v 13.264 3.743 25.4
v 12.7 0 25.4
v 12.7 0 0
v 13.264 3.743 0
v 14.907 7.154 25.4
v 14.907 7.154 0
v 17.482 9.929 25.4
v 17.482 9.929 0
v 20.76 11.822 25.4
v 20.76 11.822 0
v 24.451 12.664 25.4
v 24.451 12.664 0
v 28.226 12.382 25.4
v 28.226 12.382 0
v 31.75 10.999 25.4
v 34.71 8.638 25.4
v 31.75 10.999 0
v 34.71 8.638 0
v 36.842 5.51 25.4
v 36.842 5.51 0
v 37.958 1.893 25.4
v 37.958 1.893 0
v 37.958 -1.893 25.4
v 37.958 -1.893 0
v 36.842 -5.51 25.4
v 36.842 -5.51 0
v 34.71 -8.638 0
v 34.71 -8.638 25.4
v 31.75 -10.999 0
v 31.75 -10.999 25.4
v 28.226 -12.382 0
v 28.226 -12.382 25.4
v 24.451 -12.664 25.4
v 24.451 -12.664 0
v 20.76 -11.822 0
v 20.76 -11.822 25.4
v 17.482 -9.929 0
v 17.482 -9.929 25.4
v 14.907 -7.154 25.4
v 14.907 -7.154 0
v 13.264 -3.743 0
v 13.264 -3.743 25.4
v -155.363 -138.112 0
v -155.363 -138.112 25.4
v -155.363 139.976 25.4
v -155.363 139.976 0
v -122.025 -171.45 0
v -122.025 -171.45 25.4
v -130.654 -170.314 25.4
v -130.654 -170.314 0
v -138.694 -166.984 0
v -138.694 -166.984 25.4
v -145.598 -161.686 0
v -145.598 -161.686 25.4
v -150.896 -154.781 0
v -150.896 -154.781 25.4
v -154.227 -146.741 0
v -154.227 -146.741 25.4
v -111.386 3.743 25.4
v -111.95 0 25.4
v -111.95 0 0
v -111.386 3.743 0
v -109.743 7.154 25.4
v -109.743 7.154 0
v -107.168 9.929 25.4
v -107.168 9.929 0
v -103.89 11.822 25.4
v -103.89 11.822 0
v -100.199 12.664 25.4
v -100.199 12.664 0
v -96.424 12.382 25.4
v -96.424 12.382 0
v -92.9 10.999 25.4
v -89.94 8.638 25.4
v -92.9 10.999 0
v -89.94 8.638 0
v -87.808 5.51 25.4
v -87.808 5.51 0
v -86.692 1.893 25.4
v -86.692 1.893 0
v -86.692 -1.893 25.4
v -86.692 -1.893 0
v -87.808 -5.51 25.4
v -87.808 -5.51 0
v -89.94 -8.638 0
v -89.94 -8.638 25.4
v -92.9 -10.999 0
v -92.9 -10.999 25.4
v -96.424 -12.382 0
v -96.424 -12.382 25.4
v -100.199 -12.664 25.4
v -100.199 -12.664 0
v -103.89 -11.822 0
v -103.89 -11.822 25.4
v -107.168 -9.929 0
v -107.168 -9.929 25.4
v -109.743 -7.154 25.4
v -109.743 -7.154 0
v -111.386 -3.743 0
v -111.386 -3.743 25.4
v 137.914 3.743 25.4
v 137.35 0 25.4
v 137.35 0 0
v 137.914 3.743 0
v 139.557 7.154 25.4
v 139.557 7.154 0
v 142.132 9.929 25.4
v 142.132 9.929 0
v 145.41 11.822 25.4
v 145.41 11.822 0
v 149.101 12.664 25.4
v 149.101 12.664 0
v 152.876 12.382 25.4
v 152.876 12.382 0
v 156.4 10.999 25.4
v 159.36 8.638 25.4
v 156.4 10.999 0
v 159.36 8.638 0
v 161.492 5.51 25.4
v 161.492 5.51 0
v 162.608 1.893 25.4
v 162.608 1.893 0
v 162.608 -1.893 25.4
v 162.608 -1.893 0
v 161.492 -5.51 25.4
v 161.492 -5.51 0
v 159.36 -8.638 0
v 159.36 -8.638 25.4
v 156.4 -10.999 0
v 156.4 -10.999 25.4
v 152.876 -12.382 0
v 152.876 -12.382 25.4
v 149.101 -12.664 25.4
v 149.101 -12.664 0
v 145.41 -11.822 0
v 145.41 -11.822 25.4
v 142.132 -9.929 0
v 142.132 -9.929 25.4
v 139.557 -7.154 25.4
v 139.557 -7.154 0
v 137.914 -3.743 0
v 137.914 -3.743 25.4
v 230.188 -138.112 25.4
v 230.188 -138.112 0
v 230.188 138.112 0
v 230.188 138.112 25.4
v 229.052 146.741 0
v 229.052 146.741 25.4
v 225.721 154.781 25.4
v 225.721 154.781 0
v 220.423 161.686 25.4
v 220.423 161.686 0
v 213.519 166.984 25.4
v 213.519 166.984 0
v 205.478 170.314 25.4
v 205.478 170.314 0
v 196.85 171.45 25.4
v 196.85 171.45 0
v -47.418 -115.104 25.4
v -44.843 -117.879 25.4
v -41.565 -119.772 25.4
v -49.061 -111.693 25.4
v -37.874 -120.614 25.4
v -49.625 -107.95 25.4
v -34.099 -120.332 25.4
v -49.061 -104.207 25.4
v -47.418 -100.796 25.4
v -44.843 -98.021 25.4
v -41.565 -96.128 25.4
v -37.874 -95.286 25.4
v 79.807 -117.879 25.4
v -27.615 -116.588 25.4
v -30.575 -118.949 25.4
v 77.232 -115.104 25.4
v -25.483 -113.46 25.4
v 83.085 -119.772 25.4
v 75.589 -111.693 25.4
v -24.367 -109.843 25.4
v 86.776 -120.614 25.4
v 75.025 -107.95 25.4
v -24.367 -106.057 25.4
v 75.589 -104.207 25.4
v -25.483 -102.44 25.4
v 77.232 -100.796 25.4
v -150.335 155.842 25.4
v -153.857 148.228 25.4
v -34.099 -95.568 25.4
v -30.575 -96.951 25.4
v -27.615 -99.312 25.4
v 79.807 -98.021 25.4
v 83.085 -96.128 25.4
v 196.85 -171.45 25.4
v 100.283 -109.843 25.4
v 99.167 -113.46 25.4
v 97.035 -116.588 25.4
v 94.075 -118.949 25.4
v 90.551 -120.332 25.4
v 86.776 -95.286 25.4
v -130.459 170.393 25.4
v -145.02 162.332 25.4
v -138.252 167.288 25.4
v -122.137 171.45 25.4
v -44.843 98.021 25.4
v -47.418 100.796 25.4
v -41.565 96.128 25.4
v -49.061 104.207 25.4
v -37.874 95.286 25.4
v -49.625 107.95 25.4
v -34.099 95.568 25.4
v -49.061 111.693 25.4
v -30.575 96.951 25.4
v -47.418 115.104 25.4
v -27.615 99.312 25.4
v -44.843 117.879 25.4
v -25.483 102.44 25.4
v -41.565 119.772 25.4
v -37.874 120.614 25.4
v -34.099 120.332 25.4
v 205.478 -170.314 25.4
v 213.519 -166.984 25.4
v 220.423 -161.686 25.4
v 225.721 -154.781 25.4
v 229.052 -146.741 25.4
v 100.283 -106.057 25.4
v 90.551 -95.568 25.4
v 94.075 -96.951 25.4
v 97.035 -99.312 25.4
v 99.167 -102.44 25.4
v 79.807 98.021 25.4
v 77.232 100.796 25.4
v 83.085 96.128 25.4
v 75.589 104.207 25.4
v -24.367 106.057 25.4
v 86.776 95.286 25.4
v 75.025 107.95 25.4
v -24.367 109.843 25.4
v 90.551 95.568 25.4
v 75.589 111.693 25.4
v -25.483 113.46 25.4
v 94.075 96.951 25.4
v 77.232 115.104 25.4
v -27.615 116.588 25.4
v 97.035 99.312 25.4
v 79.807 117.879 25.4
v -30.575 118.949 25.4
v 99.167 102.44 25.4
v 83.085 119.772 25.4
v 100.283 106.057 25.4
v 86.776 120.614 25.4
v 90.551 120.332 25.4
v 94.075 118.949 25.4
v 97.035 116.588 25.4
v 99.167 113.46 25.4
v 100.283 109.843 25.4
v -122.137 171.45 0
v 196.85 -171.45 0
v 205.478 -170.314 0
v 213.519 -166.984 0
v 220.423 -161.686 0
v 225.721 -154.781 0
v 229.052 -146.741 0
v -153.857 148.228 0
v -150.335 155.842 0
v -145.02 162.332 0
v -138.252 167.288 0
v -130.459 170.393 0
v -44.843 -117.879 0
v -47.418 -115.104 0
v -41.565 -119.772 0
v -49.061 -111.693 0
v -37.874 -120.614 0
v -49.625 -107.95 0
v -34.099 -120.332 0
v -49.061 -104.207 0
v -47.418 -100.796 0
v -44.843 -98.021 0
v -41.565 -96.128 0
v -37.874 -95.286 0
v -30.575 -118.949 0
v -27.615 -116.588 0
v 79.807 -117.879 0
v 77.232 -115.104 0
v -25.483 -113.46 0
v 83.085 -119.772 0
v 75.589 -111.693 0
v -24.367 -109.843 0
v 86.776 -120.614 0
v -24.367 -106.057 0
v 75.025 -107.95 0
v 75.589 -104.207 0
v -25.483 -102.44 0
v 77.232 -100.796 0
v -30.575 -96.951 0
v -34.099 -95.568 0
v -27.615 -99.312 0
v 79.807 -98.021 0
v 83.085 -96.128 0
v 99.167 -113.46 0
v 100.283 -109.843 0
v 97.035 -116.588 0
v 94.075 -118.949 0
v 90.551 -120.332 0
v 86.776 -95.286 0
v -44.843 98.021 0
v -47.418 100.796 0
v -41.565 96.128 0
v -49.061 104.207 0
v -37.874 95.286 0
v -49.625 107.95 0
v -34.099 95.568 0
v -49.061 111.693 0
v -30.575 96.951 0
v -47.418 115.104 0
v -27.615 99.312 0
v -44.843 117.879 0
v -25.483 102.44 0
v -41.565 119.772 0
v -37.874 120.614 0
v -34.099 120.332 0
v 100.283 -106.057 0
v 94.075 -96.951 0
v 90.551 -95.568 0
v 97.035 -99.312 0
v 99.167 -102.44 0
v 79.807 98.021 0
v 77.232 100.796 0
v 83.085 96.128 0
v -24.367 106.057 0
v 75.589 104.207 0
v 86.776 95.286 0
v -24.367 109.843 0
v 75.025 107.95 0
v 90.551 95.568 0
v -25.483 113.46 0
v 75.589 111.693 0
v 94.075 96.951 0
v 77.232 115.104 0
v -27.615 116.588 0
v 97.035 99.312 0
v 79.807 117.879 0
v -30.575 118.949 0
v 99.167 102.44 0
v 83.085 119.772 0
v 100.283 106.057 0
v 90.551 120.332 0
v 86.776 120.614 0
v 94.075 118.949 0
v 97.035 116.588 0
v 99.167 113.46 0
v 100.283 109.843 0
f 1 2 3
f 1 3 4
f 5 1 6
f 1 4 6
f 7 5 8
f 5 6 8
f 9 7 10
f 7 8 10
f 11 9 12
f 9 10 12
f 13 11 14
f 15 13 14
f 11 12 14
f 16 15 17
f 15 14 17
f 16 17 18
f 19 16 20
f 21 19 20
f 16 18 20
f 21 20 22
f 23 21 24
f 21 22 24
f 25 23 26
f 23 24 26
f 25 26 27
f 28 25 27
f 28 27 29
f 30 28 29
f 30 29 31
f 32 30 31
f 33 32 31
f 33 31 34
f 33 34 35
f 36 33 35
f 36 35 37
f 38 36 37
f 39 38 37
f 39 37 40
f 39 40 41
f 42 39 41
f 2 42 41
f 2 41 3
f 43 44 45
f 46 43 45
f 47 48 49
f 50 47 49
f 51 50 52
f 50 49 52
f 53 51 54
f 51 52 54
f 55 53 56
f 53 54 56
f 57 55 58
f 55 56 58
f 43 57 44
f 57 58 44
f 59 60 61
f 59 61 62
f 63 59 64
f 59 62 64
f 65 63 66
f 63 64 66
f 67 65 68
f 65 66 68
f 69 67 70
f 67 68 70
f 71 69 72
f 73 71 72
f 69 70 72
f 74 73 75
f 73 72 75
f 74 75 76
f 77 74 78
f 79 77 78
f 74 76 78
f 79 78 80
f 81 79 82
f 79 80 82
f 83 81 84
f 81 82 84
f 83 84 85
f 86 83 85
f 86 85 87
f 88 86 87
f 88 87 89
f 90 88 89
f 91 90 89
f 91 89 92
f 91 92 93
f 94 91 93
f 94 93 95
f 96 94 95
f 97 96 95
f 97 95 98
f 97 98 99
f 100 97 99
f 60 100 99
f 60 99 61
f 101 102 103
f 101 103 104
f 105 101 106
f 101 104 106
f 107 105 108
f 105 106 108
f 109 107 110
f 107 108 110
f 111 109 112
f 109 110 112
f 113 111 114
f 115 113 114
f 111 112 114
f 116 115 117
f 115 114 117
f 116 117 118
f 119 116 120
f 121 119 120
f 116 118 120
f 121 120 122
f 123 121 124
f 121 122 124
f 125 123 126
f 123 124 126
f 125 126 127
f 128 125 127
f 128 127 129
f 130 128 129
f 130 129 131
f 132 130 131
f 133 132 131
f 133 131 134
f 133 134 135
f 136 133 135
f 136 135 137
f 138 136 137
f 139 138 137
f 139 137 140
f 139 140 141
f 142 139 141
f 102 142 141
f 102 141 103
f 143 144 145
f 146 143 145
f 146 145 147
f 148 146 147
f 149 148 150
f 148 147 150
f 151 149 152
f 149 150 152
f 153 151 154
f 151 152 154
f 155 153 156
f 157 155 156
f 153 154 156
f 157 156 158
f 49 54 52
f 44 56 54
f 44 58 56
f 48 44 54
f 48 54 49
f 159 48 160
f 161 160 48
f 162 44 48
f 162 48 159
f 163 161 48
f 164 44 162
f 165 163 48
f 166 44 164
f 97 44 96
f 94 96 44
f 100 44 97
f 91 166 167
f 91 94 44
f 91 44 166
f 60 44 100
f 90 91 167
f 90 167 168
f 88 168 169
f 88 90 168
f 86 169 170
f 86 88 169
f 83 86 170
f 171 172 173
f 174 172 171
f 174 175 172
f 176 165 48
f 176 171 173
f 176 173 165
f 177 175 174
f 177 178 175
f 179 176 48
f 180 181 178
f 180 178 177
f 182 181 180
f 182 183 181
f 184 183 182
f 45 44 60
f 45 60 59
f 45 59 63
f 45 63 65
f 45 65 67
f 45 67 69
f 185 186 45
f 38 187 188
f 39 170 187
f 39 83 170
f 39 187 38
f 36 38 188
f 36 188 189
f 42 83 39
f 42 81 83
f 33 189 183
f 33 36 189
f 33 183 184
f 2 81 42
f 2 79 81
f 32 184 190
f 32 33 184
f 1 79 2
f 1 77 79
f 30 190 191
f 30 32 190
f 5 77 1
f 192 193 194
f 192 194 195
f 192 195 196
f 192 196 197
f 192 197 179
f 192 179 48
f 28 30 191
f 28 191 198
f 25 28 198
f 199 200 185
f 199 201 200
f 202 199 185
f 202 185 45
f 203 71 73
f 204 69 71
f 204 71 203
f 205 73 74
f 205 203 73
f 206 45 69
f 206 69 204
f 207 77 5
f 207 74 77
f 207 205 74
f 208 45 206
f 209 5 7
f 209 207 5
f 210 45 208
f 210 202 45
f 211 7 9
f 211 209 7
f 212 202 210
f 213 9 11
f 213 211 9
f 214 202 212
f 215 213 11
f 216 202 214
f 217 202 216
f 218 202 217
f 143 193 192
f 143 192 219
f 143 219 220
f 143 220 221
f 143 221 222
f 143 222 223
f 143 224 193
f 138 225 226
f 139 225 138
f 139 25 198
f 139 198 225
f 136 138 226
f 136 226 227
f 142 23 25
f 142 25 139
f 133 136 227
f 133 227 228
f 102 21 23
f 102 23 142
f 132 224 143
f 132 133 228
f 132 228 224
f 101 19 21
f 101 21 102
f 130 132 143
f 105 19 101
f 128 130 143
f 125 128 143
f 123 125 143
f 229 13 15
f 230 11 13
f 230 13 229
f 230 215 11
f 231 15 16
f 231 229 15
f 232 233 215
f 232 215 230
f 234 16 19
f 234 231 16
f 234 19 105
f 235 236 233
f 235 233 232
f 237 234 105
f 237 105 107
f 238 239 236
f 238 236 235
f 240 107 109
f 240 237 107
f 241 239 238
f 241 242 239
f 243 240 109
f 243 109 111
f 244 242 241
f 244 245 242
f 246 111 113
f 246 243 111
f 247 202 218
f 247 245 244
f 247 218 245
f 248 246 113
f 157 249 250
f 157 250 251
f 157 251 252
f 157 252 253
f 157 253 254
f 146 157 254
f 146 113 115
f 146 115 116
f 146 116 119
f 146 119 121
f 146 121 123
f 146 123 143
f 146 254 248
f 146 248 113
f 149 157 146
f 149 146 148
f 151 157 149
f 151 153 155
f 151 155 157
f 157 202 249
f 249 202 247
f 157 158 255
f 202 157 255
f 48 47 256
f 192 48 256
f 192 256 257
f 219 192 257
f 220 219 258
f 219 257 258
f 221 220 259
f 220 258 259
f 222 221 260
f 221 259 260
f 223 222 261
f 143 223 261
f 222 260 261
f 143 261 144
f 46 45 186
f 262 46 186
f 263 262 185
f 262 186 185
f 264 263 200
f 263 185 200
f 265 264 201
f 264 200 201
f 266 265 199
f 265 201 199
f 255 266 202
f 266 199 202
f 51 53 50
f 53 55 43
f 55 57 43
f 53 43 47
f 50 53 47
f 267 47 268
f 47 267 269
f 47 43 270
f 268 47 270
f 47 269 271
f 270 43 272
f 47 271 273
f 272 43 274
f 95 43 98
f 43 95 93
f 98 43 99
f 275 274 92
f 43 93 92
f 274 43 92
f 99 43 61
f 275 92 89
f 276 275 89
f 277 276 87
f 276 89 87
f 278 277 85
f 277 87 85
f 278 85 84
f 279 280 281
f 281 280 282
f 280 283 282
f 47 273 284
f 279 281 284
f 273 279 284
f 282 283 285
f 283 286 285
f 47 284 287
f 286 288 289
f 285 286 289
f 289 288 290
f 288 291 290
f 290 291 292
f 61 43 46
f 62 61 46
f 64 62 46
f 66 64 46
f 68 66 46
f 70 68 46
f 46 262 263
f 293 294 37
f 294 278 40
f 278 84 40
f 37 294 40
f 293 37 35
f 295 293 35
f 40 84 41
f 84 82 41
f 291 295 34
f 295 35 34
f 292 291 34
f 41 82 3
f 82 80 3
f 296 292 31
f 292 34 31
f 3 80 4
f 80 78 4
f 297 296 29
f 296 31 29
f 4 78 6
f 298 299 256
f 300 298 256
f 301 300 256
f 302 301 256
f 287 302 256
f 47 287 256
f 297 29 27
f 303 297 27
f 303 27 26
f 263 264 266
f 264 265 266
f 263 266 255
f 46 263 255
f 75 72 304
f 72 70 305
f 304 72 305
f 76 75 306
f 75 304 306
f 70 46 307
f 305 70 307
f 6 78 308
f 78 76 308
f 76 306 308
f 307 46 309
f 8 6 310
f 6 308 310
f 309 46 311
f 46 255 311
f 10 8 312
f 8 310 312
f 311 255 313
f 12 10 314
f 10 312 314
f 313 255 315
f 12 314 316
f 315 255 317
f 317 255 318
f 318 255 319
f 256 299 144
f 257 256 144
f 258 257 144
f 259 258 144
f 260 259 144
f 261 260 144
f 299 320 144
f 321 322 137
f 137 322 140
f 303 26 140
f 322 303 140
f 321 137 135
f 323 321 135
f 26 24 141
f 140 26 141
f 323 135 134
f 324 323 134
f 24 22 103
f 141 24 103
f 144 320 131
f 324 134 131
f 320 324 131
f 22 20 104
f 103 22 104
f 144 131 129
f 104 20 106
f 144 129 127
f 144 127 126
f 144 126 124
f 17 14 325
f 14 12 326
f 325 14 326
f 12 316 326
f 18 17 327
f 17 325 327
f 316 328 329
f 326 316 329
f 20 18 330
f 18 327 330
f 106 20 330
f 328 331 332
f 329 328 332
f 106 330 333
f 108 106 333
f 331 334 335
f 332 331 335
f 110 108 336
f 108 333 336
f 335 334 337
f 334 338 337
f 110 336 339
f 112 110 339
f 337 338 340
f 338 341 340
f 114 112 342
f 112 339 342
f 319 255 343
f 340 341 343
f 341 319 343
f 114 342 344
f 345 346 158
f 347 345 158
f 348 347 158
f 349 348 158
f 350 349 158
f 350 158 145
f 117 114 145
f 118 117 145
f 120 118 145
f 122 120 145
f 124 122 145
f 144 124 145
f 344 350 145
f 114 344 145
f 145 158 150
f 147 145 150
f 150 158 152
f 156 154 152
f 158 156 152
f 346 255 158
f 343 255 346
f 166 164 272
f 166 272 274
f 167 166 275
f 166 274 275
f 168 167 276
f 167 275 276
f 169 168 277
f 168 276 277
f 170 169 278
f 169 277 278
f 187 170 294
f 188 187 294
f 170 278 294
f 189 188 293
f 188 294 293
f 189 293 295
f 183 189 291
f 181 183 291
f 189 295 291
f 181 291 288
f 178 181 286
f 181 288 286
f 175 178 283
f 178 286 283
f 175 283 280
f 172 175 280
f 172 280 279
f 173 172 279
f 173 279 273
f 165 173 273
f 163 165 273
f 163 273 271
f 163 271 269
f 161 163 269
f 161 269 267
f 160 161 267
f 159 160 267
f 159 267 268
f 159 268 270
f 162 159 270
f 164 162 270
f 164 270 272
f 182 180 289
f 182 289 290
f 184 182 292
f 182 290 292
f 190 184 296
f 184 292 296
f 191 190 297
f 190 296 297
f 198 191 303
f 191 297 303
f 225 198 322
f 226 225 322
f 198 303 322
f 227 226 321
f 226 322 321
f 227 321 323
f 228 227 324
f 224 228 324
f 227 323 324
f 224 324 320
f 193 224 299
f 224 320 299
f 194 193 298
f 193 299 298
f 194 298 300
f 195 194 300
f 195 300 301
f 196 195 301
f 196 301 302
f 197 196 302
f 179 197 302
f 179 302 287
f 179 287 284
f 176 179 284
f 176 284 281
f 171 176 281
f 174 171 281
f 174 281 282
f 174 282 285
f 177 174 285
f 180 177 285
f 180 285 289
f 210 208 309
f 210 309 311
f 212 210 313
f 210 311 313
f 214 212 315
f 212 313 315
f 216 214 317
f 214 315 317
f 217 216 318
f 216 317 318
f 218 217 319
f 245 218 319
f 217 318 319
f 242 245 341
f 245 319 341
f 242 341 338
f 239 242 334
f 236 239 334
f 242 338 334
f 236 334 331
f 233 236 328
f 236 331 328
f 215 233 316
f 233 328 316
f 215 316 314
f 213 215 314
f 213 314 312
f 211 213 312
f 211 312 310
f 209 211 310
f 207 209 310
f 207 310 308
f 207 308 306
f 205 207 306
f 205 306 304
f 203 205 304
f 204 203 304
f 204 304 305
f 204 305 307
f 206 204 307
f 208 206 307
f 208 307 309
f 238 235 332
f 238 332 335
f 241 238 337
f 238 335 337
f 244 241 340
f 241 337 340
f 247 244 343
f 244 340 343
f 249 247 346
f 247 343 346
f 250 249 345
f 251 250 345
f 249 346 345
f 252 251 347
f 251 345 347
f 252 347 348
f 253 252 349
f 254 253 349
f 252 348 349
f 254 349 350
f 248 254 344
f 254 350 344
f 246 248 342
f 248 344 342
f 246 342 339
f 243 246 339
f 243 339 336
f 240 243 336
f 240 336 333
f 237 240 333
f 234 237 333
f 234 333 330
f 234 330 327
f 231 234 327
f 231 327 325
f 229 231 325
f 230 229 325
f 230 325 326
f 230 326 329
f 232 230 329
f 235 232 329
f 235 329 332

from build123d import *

# Parameters (mm, degrees)
BOSS_EXTRUDE1_DEPTH    = 25.4
CUT_EXTRUDE1_DEPTH     = 25.4
F_1_1_DIAMETER_HOLE1_D = 25.4


with BuildPart() as part:
    # Sketch1 → Boss-Extrude1 (new body)
    with BuildSketch(Plane.XY):
        with BuildLine():
            Line((-196.85, -171.45), (196.85, -171.45))
            ThreePointArc((196.85, -171.45), (220.423172318, -161.685672318), (230.1875, -138.1125))
            Line((230.1875, -138.1125), (230.1875, 138.1125))
            ThreePointArc((230.1875, 138.1125), (220.423172318, 161.685672318), (196.85, 171.45))
            Line((196.85, 171.45), (-196.85, 171.45))
            ThreePointArc((-196.85, 171.45), (-220.423172318, 161.685672318), (-230.1875, 138.1125))
            Line((-230.1875, 138.1125), (-230.1875, -138.1125))
            ThreePointArc((-230.1875, -138.1125), (-220.423172318, -161.685672318), (-196.85, -171.45))
        make_face()
    extrude(amount=BOSS_EXTRUDE1_DEPTH)

    # Sketch2 → Cut-Extrude1 (cut)
    with BuildSketch(Plane.XY.offset(25.4)):
        with BuildLine():
            Line((-230.1875, 138.1125), (-230.1875, -138.1125))
            ThreePointArc((-230.1875, -138.1125), (-220.423172318, -161.685672318), (-196.85, -171.45))
            Line((-196.85, -171.45), (-122.025168103, -171.45))
            ThreePointArc((-122.025168103, -171.45), (-145.59834042, -161.685672318), (-155.362668103, -138.1125))
            Line((-155.362668103, -138.1125), (-155.362668103, 139.975839194))
            ThreePointArc((-155.362668103, 139.975839194), (-145.020467472, 162.332230308), (-122.137381725, 171.45))
            Line((-122.137381725, 171.45), (-155.460095347, 171.45))
            Line((-155.460095347, 171.45), (-196.85, 171.45))
            ThreePointArc((-196.85, 171.45), (-220.423172318, 161.685672318), (-230.1875, 138.1125))
        make_face()
    extrude(amount=-CUT_EXTRUDE1_DEPTH, mode=Mode.SUBTRACT)

    # 1 (1) Diameter Hole1 (through all)
    with Locations(Plane.XY.offset(25.4)):
        with Locations((25.4, 0), (-36.924961559, 107.95), (87.724961559, 107.95), (150.049923118, 0), (87.724961559, -107.95), (-36.924961559, -107.95), (-99.249923118, 0)):
            Hole(F_1_1_DIAMETER_HOLE1_D / 2)


solid = part.part
